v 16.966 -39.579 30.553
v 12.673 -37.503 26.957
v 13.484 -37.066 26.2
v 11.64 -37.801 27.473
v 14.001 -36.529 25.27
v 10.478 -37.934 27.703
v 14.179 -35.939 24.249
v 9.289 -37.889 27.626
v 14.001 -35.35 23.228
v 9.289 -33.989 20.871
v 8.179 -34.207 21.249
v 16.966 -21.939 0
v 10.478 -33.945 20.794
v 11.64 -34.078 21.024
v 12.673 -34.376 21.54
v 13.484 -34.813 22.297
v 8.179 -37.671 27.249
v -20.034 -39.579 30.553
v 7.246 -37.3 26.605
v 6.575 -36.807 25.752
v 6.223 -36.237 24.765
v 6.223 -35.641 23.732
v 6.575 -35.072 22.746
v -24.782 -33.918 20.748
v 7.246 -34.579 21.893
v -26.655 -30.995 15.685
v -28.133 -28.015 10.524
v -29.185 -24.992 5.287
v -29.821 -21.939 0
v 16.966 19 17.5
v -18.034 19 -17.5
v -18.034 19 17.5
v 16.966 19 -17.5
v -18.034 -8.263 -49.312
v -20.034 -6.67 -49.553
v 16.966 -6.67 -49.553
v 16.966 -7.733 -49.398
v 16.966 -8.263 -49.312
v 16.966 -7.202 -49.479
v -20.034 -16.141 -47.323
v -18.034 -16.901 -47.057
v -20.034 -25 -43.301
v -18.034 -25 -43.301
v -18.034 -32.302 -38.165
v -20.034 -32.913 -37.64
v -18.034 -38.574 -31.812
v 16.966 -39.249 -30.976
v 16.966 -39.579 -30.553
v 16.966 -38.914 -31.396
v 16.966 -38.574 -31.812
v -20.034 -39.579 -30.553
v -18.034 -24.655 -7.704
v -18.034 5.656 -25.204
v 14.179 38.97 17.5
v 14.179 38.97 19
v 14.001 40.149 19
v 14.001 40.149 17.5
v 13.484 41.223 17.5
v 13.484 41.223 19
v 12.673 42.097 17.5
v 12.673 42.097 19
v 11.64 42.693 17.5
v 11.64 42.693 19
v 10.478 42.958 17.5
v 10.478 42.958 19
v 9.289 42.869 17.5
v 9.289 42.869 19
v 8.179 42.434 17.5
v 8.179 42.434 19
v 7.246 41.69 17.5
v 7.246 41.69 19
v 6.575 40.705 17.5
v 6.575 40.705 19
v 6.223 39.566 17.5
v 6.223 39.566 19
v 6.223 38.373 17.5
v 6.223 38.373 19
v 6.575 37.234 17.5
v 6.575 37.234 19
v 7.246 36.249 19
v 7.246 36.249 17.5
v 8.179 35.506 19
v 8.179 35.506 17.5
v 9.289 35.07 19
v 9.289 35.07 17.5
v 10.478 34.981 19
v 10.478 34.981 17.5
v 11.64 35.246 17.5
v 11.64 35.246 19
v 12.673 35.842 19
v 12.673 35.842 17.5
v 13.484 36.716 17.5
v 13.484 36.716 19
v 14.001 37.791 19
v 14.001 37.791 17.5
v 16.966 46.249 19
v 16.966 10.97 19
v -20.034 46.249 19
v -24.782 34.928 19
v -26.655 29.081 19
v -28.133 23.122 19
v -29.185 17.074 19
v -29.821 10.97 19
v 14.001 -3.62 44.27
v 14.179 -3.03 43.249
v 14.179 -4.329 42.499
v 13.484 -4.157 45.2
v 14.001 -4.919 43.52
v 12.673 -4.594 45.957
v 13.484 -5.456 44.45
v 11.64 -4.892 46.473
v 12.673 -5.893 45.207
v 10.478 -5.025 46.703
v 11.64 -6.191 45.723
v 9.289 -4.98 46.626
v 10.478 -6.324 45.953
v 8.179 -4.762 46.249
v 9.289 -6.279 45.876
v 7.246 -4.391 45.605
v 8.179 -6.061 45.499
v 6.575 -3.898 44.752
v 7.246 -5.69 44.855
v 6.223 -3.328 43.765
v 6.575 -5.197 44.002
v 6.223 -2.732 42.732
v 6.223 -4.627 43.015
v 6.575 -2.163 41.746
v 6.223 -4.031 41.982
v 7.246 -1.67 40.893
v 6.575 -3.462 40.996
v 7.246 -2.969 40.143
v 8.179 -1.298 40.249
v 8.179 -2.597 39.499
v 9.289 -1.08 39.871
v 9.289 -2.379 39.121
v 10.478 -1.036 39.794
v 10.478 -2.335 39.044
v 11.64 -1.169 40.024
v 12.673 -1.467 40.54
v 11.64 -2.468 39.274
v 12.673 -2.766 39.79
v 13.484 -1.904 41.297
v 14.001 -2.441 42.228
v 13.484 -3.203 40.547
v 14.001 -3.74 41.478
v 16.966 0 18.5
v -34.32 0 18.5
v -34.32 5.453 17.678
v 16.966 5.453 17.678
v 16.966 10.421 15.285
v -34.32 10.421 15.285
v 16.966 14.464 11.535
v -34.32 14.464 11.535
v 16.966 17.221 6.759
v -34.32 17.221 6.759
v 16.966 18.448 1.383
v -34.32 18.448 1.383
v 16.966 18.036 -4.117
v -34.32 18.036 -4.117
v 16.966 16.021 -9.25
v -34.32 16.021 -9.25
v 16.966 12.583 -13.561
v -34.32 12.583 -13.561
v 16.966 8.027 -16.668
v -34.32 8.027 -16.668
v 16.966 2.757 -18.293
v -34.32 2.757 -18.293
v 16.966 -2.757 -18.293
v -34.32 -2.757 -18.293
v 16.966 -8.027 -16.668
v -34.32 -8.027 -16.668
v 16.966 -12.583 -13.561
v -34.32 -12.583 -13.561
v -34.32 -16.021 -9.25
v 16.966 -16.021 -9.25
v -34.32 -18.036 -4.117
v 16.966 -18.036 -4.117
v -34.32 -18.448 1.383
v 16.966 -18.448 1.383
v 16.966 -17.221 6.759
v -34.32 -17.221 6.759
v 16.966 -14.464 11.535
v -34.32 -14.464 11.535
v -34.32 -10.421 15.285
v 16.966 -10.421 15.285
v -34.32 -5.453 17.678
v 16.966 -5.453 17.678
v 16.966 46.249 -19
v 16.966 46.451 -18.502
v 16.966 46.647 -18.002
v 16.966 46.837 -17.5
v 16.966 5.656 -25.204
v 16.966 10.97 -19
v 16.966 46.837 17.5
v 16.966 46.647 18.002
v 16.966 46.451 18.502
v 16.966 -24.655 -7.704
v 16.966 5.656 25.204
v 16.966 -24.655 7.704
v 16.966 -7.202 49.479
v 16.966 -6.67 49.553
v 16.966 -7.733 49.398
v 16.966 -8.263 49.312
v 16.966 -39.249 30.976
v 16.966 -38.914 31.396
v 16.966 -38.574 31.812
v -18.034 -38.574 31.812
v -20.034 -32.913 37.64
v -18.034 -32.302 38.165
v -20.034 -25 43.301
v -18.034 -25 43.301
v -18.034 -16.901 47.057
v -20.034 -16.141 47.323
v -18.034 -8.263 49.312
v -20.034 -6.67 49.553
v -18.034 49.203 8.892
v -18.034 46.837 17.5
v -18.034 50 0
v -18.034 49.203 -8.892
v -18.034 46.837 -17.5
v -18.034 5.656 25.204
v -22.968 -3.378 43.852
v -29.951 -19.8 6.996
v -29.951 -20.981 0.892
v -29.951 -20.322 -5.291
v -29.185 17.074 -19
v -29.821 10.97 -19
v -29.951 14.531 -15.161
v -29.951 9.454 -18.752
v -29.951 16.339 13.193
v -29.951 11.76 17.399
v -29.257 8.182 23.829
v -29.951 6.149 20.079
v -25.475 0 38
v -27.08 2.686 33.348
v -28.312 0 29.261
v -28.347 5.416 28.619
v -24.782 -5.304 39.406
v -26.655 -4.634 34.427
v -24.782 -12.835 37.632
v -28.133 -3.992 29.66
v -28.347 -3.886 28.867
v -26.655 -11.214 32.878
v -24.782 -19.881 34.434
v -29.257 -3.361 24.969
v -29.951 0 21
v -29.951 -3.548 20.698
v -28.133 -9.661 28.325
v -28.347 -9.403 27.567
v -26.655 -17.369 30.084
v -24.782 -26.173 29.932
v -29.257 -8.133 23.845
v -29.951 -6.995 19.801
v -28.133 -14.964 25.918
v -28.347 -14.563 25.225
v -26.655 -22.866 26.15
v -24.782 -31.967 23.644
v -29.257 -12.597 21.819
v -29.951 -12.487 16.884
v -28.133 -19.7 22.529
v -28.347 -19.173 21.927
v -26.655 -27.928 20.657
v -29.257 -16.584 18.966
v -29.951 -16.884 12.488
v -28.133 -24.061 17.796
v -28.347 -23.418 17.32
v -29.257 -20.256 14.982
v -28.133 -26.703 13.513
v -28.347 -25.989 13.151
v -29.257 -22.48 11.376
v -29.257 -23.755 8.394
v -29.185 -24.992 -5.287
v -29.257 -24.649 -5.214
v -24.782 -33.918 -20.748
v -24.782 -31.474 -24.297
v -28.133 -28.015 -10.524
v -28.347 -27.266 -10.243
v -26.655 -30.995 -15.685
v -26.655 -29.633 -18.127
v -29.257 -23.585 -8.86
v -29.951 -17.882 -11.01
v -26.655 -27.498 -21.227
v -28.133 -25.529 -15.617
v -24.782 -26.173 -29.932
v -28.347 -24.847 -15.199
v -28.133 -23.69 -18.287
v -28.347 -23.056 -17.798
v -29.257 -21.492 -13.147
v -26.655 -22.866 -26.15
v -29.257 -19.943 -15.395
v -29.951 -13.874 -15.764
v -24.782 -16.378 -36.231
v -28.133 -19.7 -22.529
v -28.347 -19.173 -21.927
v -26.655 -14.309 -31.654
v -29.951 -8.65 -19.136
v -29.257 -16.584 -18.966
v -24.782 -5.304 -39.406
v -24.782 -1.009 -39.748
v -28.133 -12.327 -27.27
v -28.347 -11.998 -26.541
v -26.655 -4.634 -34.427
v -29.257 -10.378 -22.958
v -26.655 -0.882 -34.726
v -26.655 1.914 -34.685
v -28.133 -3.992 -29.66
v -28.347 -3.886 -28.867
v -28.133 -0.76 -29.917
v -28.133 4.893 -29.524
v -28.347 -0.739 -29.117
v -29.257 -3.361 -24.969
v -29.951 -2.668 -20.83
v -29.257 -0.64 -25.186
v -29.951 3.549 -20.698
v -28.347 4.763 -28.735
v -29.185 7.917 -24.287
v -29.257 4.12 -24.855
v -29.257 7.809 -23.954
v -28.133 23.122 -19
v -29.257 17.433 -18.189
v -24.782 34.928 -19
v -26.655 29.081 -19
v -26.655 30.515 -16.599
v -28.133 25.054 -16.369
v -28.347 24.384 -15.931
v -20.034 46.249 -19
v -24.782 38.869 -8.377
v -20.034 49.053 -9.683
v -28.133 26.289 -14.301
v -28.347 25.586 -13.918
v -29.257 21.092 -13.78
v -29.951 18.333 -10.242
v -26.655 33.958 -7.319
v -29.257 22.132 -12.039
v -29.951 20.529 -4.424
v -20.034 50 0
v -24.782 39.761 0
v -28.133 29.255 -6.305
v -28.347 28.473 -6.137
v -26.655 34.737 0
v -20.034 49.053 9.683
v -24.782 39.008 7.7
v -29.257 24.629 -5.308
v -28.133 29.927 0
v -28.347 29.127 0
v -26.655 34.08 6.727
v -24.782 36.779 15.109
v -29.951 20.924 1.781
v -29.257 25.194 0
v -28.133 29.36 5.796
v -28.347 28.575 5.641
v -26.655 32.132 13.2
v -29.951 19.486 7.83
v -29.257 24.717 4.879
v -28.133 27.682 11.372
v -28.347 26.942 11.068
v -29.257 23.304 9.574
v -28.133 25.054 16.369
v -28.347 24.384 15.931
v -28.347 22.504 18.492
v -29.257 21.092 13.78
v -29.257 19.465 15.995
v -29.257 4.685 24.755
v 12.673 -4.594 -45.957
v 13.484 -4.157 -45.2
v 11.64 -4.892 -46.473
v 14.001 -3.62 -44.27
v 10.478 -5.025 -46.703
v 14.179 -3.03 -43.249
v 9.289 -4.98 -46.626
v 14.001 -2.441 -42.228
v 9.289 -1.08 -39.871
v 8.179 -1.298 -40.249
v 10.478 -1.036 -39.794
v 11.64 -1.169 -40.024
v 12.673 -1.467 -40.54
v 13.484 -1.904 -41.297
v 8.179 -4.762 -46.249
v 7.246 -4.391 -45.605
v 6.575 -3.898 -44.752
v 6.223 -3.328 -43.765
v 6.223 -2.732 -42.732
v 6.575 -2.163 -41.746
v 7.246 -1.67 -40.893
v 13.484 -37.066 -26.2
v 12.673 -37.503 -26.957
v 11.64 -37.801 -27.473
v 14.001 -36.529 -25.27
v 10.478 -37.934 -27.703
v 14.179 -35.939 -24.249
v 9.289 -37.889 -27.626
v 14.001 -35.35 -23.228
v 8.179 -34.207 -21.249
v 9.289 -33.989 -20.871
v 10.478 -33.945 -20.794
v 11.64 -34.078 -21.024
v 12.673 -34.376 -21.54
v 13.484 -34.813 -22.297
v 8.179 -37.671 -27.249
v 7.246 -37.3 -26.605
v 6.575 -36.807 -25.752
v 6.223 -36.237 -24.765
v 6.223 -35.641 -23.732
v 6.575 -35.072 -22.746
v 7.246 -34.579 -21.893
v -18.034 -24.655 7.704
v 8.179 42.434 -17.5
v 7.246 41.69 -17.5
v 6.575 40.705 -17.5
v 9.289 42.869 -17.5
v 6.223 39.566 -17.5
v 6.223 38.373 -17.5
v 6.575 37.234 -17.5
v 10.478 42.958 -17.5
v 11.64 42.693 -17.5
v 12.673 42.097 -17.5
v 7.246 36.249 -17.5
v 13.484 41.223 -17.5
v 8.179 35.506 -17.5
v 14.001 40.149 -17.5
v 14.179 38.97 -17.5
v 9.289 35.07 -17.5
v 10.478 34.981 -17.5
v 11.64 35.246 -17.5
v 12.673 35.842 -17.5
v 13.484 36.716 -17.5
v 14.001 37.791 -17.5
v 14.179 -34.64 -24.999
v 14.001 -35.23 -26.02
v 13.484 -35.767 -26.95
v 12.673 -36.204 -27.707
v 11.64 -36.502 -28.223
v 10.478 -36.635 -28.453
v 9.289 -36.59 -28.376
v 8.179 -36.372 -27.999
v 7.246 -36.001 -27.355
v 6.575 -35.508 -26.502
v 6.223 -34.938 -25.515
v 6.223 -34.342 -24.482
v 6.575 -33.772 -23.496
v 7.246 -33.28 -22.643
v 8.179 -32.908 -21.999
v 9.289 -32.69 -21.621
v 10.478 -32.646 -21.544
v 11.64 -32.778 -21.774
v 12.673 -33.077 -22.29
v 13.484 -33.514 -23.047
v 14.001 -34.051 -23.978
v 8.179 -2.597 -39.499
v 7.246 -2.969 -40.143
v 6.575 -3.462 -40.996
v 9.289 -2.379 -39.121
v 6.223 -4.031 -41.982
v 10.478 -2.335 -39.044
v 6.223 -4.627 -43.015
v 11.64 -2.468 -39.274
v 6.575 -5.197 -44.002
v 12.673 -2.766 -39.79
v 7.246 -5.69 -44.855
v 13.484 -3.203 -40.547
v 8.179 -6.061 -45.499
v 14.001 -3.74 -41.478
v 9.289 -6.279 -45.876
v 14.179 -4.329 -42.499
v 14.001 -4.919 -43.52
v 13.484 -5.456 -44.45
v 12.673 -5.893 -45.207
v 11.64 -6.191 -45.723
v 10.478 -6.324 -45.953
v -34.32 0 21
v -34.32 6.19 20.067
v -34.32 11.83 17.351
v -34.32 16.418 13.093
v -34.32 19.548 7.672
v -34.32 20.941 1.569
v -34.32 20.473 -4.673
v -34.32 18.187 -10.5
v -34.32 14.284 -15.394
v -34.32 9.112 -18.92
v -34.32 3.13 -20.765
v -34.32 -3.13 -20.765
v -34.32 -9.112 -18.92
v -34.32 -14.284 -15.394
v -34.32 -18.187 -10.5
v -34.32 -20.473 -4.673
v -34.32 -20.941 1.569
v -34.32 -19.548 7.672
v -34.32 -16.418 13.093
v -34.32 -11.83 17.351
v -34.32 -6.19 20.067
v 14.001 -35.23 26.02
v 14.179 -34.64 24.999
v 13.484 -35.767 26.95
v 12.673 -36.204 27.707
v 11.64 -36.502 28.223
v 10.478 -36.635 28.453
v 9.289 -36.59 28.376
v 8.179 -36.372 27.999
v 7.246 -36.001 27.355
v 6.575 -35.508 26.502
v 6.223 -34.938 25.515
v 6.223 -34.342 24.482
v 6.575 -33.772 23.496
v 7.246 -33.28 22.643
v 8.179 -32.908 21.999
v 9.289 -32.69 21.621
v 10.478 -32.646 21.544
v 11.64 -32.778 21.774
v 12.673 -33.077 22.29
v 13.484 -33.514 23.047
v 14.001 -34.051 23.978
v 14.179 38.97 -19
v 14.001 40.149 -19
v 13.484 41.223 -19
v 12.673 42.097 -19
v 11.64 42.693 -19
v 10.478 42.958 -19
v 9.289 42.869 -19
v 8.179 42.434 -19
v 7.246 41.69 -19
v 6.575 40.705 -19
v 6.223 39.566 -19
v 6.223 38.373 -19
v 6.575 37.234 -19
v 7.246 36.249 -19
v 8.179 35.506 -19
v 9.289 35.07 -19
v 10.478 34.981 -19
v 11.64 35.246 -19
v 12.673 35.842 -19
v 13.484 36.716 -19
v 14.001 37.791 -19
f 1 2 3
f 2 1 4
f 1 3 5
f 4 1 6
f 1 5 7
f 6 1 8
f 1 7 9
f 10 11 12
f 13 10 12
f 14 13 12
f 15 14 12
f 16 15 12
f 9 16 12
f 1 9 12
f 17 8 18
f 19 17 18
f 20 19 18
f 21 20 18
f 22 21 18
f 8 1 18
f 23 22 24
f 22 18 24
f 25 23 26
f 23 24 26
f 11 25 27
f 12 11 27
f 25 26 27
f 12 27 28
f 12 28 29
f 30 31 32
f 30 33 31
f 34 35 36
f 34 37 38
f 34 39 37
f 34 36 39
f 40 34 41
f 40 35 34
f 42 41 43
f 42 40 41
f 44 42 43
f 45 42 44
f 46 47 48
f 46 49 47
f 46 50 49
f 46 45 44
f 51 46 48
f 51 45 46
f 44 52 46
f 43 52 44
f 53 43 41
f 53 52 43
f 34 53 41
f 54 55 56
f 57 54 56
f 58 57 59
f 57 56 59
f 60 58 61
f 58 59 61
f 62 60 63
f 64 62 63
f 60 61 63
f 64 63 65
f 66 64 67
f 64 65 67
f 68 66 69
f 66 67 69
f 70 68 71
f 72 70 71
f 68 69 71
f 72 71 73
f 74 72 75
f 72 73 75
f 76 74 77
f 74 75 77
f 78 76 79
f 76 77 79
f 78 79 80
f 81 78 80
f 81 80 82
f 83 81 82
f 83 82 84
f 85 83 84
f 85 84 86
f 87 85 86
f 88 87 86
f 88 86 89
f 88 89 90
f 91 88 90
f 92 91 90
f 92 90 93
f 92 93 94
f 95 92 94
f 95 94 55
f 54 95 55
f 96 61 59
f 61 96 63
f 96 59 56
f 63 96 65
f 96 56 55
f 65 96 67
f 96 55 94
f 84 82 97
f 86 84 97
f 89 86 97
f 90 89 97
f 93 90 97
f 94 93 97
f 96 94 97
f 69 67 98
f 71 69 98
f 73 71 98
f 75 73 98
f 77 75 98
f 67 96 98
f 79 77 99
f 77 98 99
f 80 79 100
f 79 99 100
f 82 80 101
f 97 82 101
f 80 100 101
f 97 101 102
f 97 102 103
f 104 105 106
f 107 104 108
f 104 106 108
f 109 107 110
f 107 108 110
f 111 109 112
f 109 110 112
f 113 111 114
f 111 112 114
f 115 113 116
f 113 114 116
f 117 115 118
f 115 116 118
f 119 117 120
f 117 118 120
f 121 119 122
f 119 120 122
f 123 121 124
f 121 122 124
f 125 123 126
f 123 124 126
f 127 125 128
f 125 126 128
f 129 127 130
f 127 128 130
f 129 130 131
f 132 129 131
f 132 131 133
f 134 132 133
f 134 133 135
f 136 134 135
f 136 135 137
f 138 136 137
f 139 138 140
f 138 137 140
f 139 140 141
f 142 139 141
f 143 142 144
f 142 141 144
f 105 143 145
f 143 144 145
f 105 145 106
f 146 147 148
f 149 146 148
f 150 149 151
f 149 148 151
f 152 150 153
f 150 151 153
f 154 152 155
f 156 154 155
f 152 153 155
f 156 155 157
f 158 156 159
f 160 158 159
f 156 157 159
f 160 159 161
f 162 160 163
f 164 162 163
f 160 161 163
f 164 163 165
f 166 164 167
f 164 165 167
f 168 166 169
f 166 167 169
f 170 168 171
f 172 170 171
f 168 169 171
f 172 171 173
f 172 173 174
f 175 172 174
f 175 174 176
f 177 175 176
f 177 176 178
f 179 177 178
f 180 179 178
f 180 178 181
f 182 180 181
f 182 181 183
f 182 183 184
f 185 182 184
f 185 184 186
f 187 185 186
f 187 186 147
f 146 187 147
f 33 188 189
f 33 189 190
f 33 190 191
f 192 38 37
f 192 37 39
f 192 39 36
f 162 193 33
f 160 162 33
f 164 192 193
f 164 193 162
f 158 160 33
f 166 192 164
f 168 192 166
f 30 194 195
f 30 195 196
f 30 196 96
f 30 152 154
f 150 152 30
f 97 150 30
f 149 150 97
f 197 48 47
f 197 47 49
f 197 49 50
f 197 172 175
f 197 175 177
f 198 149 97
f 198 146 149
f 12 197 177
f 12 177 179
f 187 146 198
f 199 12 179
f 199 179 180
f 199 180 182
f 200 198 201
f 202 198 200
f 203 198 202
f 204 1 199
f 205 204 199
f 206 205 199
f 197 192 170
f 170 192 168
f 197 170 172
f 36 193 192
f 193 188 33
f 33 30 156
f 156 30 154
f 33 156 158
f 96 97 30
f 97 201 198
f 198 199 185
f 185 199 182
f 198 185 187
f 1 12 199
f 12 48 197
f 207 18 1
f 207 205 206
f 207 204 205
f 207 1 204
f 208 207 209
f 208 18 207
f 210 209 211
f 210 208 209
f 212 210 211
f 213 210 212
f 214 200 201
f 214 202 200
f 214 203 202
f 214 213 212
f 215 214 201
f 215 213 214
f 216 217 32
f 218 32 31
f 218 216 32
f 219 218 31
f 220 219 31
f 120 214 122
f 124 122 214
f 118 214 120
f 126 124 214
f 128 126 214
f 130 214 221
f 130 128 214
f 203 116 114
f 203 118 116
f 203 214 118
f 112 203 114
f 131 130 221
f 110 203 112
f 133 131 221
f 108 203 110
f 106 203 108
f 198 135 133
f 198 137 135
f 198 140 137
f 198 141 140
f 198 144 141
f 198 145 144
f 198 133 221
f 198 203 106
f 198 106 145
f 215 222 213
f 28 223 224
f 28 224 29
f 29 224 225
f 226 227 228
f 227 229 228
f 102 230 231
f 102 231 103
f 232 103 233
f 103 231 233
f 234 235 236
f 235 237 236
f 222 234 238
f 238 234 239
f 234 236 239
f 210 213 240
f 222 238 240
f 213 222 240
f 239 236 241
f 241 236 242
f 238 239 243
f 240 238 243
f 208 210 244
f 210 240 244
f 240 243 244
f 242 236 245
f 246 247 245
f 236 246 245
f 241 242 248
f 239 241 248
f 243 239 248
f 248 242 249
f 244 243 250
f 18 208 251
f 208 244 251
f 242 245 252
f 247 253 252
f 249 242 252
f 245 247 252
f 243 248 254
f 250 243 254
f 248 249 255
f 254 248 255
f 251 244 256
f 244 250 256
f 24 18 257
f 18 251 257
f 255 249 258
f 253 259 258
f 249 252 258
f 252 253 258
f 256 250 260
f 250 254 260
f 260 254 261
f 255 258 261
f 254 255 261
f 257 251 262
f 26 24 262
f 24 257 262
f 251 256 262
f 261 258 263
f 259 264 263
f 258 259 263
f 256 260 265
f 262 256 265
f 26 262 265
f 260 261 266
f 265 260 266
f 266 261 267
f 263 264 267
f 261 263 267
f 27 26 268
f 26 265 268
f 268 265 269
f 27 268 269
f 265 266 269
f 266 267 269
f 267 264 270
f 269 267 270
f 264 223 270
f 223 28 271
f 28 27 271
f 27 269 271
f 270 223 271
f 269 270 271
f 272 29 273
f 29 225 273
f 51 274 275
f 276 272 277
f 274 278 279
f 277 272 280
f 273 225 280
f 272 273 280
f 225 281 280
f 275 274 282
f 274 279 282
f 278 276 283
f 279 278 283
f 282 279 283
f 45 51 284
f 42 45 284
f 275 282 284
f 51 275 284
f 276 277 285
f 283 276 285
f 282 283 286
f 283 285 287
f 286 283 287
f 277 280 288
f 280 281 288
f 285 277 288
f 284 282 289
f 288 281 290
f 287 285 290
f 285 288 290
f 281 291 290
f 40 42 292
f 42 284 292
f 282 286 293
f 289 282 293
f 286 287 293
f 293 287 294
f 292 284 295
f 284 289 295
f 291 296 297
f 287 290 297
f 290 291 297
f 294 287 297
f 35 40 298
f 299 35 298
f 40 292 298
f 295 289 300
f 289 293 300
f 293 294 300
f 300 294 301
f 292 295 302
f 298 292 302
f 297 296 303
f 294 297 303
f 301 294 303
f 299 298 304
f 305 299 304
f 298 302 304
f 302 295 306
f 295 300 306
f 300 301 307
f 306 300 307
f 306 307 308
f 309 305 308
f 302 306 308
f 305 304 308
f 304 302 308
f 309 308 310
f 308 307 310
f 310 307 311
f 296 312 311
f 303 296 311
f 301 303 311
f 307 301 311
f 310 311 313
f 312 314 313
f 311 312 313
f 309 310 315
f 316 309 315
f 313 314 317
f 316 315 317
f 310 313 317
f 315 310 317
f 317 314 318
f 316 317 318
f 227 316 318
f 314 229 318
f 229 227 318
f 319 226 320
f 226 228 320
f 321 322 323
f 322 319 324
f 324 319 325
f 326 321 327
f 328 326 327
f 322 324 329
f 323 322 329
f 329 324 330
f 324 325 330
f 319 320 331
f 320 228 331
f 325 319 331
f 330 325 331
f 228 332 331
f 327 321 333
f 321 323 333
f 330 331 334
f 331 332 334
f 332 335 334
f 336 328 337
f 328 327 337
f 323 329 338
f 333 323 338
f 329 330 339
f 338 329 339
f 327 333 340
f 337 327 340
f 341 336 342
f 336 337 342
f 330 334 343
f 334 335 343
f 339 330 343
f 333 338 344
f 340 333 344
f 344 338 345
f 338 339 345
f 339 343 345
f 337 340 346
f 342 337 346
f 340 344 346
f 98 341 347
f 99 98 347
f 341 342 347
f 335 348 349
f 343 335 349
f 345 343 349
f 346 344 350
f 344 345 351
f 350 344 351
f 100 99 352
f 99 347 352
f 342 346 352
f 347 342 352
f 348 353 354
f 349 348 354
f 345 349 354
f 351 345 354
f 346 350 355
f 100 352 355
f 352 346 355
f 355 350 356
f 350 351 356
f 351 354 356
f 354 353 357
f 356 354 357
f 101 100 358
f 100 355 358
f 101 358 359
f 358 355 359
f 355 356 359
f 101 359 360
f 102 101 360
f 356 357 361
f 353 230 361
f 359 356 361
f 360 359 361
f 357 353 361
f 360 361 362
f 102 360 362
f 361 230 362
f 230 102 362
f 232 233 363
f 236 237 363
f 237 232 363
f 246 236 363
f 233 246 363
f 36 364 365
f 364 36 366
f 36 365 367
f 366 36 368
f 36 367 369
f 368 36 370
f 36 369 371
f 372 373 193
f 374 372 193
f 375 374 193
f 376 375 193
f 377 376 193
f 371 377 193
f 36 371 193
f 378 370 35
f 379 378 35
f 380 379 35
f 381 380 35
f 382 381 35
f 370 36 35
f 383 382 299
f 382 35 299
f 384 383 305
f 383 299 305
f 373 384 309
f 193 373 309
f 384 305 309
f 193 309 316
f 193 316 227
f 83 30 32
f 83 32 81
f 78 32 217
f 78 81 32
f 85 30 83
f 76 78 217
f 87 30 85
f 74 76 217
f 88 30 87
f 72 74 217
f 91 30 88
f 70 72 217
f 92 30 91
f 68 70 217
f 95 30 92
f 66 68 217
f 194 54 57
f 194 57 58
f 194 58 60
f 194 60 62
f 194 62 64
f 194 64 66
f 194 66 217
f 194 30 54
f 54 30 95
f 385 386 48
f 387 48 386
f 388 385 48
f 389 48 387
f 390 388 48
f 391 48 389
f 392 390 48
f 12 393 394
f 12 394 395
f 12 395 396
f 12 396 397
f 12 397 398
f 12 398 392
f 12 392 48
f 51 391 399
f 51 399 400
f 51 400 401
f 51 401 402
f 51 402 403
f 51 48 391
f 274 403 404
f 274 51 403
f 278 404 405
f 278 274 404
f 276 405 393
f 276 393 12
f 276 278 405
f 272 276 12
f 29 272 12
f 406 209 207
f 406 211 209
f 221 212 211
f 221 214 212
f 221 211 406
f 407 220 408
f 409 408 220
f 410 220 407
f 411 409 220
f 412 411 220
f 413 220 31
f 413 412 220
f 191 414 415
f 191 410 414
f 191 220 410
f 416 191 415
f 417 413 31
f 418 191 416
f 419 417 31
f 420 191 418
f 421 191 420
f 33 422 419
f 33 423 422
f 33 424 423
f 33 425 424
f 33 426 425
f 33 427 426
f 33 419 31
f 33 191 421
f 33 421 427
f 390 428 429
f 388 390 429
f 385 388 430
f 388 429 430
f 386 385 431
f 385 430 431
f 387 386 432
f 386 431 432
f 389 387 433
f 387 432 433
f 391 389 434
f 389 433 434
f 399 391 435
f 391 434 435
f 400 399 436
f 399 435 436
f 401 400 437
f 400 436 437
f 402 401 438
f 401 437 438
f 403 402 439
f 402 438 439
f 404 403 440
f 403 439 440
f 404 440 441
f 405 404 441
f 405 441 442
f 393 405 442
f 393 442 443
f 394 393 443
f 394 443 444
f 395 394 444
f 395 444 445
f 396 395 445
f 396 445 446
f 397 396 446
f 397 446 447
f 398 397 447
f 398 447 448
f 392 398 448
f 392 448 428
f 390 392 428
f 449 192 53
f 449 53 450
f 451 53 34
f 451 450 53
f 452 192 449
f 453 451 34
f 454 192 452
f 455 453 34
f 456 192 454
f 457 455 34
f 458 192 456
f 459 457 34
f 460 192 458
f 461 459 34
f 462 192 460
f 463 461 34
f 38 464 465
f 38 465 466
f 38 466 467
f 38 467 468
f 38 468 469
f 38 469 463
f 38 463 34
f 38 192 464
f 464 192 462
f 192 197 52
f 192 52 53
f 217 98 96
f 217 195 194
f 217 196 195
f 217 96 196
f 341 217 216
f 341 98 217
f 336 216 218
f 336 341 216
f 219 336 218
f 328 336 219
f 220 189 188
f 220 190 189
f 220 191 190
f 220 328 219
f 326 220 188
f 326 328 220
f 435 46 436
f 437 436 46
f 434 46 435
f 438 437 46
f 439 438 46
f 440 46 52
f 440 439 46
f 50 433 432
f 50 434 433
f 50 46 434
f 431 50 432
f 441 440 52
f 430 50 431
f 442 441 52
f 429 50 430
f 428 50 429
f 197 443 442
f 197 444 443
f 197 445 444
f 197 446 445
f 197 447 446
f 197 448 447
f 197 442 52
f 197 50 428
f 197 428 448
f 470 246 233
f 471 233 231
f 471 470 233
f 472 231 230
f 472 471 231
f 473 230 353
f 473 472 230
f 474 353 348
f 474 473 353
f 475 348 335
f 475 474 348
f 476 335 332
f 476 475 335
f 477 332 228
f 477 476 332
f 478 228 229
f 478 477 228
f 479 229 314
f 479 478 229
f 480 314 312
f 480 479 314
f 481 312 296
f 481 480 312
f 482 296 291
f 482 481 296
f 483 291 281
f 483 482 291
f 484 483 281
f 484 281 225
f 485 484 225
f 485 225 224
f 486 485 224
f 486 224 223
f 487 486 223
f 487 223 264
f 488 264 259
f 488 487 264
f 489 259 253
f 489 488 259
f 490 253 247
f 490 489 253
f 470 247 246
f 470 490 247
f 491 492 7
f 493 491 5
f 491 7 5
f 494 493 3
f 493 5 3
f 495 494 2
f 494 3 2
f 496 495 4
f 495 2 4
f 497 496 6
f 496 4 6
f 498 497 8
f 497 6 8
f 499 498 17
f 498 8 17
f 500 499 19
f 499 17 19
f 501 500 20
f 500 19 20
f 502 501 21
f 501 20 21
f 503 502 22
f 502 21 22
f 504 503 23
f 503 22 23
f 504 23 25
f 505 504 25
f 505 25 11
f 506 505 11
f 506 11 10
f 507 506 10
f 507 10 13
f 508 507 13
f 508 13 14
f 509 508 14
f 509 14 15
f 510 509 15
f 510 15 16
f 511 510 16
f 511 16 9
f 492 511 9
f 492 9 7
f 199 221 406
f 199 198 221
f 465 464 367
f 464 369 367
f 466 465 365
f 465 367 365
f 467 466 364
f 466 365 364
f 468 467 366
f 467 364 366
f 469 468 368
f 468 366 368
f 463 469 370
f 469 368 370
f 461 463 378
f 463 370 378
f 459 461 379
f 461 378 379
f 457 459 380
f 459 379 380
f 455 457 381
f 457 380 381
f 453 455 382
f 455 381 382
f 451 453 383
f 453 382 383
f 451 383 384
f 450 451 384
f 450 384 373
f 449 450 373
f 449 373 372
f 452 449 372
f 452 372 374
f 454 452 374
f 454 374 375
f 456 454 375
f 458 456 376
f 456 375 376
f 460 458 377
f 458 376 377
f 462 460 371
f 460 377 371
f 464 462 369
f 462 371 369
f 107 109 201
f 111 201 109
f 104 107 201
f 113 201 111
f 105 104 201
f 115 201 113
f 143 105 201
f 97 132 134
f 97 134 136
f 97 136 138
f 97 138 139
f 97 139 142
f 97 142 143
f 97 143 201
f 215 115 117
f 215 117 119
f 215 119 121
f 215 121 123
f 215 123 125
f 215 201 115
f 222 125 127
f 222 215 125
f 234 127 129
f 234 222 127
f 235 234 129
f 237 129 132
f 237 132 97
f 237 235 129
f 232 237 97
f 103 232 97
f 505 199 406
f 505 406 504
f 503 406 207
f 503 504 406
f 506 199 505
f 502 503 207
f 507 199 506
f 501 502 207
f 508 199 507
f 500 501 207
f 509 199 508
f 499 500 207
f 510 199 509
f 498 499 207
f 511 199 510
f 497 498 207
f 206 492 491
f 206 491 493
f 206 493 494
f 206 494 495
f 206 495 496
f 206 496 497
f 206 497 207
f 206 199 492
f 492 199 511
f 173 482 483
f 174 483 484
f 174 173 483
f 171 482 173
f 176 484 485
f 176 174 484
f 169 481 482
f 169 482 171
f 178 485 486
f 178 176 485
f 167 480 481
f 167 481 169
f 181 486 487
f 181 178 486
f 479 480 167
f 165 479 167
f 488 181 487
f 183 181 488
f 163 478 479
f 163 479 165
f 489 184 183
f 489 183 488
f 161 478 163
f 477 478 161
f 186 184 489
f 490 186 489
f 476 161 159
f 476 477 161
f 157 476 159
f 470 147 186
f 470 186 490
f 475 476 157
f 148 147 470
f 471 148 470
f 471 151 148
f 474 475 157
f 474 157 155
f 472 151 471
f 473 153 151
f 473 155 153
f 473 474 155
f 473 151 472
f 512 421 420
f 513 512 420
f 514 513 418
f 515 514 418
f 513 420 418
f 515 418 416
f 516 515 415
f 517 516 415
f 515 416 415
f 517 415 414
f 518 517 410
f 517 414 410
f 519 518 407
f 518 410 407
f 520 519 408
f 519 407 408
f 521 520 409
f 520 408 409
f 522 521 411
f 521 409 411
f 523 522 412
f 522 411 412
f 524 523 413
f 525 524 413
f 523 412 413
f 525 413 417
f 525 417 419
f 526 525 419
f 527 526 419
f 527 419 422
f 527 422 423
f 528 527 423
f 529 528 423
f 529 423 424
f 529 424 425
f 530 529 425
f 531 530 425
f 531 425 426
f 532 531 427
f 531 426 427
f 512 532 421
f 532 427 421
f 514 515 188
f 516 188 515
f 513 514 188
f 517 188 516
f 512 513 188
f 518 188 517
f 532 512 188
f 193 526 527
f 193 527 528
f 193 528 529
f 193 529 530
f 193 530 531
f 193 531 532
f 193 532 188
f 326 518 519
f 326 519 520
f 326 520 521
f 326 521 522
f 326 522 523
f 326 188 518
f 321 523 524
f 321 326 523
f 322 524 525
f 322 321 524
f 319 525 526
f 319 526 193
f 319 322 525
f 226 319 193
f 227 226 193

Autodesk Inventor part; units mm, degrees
ref_plane "YZ Plane" through (0, 0, 0) normal (1, 0, 0) x (0, 1, 0)
ref_plane "XZ Plane" through (0, 0, 0) normal (0, 1, 0) x (-1, 0, 0)
ref_plane "XY Plane" through (0, 0, 0) normal (0, 0, 1) x (1, 0, 0)
sketch "Boceto1" plane through (0, 0, 0) normal (0, 1, 0) x (-1, 0, 0)
  line L0 (116.8368, 0) -> (-138.9188, 0) construction
  line L1 (0, 201.6217) -> (0, -202.3506) construction
  line L2 (-16.9655, 0) -> (-16.9655, 50)
  line L3 (-16.9655, 50) -> (20.0345, 50)
  spline S0 degree 2 poles (20.0345, 50) (29.4829, 31.811) (30.3202, 17.0589) knots 0 0 0 1 1 1
  line L4 (30.3202, 17.0589) -> (30.3202, 0)
  line L5 (30.3202, 0) -> (-16.9655, 0)
  point P0 (0, 0)
  point P1 (27.7444, 31.3016)
  dimension "d0" = 50
  dimension "d1" = 37
  dimension "d2" = 30.3202
  dimension "d3" = 47.2856
  dimension "d4" = 86.5167
  dimension "d5" = 32.9412
  dimension "d6" = 2.5758
  dimension "d7" = 18.6984
  dimension "d8" = 151.6217
  dimension "d9" = 252.3506
  dimension "d10" = 169.239
revolve "Revolución1" add sketch "Boceto1" angle 360 about axis through (-116.8368, 0, 0) along (1, 0, 0)
sketch "Boceto2" plane through (-30.3202, 0, 0) normal (-1, 0, 0) x (0, 0, 1)
  circle A0 centre (0, 0) radius 17.0589 projected
  circle A1 centre (0, 0) radius 21
  point P0 (17.0589, 0)
  dimension "d12" = 42
extrude "Extrusión1" add sketch "Boceto2" along normal mid plane 8 contours A0 | A1
sketch "Boceto3" plane through (-34.3202, 0, 0) normal (-1, 0, 0) x (0, 0, 1)
  circle A0 centre (0, 0) radius 18.5
  dimension "d15" = 37
extrude "Extrusión2" cut sketch "Boceto3" against normal blind 60
sketch "Boceto4" plane through (-34.3202, 0, 0) normal (-1, 0, 0) x (0, 0, 1)
  circle A0 centre (0, 0) radius 50 projected
  line L0 (-19, 46.2493) -> (-19, 8.9443)
  circle A1 centre (0, 0) radius 21 projected
  line L1 (19, 46.2493) -> (19, 8.9443)
  line L2 (0, 54.3807) -> (0, -24.3097) construction
  line L3 (-65.0318, 0) -> (77.048, 0) construction
  circle A2 centre (0, 0) radius 50 construction
  circle A3 centre (0, 0) radius 21 construction
  line L4 (-30.5531, -39.5791) -> (1.754, -20.9266)
  line L5 (-49.5531, -6.6702) -> (-17.246, 11.9823)
  circle A4 centre (0, 0) radius 21 construction
  circle A5 centre (0, 0) radius 50 construction
  line L6 (49.5531, -6.6702) -> (17.246, 11.9823)
  line L7 (30.5531, -39.5791) -> (-1.754, -20.9266)
  circle A6 centre (0, 0) radius 21 construction
  circle A7 centre (0, 0) radius 50 construction
  point P0 (19, 10.9697)
  point P1 (-19, 10.9697)
  point P2 (0, -21.9393)
  dimension "d18" = 38
  dimension "d21" = 360
extrude "Extrusión3" cut sketch "Boceto4" against normal blind 60 contours A0 L6 L1 | L0 L5 A0 | A0 L4 L7
sketch "Boceto5" plane through (-29.8214, -21.9393, 0) normal (0, -0.866, -0.5) x (1, 0, 0)
  line L0 (0, 35.9798) -> (0, -55.1659) construction
  line L1 (-10.6314, 0) -> (61.9402, 0) construction
  circle A0 centre (40, 28) radius 4
  point P0 (29.8214, -10.9697)
  point P1 (0, 0)
  dimension "d25" = 40
  dimension "d26" = 28
  dimension "d27" = 8
extrude "Extrusión4" cut sketch "Boceto5" against normal blind 60
pattern_circular "Patrón circular1" count 3 over 360 about axis through (-34.3202, 0, 0) along (1, 0, 0) of "Extrusión4"
sketch "Boceto6" plane through (16.9655, 10.9697, 19) normal (1, 0, 0) x (0, 0, -1)
  line L0 (36.5, 8.0303) -> (1.5, 8.0303)
  line L1 (1.5, 8.0303) -> (1.5, 43.8507)
  line L2 (1.5, 43.8507) -> (36.5, 43.8507)
  line L3 (36.5, 43.8507) -> (36.5, 8.0303)
  line L4 (19, 66.8345) -> (19, -59.037) construction
  line L5 (-55.9645, -10.9697) -> (107.3868, -10.9697) construction
  line L6 (-19.7258, -53.5353) -> (-37.2258, -23.2244)
  line L7 (11.2955, -35.6251) -> (-19.7258, -53.5353)
  line L8 (-37.2258, -23.2244) -> (-6.2045, -5.3142)
  line L9 (-6.2045, -5.3142) -> (11.2955, -35.6251)
  line L10 (75.2258, -23.2244) -> (57.7258, -53.5353)
  line L11 (44.2045, -5.3142) -> (75.2258, -23.2244)
  line L12 (57.7258, -53.5353) -> (26.7045, -35.6251)
  line L13 (26.7045, -35.6251) -> (44.2045, -5.3142)
  point P0 (19, -10.9697)
  point P1 (25.7111, -10.9697)
  dimension "d33" = 35
  dimension "d34" = 35.8203
  dimension "d35" = 19
  dimension "d38" = 360
extrude "Extrusión5" cut sketch "Boceto6" against normal blind 35
